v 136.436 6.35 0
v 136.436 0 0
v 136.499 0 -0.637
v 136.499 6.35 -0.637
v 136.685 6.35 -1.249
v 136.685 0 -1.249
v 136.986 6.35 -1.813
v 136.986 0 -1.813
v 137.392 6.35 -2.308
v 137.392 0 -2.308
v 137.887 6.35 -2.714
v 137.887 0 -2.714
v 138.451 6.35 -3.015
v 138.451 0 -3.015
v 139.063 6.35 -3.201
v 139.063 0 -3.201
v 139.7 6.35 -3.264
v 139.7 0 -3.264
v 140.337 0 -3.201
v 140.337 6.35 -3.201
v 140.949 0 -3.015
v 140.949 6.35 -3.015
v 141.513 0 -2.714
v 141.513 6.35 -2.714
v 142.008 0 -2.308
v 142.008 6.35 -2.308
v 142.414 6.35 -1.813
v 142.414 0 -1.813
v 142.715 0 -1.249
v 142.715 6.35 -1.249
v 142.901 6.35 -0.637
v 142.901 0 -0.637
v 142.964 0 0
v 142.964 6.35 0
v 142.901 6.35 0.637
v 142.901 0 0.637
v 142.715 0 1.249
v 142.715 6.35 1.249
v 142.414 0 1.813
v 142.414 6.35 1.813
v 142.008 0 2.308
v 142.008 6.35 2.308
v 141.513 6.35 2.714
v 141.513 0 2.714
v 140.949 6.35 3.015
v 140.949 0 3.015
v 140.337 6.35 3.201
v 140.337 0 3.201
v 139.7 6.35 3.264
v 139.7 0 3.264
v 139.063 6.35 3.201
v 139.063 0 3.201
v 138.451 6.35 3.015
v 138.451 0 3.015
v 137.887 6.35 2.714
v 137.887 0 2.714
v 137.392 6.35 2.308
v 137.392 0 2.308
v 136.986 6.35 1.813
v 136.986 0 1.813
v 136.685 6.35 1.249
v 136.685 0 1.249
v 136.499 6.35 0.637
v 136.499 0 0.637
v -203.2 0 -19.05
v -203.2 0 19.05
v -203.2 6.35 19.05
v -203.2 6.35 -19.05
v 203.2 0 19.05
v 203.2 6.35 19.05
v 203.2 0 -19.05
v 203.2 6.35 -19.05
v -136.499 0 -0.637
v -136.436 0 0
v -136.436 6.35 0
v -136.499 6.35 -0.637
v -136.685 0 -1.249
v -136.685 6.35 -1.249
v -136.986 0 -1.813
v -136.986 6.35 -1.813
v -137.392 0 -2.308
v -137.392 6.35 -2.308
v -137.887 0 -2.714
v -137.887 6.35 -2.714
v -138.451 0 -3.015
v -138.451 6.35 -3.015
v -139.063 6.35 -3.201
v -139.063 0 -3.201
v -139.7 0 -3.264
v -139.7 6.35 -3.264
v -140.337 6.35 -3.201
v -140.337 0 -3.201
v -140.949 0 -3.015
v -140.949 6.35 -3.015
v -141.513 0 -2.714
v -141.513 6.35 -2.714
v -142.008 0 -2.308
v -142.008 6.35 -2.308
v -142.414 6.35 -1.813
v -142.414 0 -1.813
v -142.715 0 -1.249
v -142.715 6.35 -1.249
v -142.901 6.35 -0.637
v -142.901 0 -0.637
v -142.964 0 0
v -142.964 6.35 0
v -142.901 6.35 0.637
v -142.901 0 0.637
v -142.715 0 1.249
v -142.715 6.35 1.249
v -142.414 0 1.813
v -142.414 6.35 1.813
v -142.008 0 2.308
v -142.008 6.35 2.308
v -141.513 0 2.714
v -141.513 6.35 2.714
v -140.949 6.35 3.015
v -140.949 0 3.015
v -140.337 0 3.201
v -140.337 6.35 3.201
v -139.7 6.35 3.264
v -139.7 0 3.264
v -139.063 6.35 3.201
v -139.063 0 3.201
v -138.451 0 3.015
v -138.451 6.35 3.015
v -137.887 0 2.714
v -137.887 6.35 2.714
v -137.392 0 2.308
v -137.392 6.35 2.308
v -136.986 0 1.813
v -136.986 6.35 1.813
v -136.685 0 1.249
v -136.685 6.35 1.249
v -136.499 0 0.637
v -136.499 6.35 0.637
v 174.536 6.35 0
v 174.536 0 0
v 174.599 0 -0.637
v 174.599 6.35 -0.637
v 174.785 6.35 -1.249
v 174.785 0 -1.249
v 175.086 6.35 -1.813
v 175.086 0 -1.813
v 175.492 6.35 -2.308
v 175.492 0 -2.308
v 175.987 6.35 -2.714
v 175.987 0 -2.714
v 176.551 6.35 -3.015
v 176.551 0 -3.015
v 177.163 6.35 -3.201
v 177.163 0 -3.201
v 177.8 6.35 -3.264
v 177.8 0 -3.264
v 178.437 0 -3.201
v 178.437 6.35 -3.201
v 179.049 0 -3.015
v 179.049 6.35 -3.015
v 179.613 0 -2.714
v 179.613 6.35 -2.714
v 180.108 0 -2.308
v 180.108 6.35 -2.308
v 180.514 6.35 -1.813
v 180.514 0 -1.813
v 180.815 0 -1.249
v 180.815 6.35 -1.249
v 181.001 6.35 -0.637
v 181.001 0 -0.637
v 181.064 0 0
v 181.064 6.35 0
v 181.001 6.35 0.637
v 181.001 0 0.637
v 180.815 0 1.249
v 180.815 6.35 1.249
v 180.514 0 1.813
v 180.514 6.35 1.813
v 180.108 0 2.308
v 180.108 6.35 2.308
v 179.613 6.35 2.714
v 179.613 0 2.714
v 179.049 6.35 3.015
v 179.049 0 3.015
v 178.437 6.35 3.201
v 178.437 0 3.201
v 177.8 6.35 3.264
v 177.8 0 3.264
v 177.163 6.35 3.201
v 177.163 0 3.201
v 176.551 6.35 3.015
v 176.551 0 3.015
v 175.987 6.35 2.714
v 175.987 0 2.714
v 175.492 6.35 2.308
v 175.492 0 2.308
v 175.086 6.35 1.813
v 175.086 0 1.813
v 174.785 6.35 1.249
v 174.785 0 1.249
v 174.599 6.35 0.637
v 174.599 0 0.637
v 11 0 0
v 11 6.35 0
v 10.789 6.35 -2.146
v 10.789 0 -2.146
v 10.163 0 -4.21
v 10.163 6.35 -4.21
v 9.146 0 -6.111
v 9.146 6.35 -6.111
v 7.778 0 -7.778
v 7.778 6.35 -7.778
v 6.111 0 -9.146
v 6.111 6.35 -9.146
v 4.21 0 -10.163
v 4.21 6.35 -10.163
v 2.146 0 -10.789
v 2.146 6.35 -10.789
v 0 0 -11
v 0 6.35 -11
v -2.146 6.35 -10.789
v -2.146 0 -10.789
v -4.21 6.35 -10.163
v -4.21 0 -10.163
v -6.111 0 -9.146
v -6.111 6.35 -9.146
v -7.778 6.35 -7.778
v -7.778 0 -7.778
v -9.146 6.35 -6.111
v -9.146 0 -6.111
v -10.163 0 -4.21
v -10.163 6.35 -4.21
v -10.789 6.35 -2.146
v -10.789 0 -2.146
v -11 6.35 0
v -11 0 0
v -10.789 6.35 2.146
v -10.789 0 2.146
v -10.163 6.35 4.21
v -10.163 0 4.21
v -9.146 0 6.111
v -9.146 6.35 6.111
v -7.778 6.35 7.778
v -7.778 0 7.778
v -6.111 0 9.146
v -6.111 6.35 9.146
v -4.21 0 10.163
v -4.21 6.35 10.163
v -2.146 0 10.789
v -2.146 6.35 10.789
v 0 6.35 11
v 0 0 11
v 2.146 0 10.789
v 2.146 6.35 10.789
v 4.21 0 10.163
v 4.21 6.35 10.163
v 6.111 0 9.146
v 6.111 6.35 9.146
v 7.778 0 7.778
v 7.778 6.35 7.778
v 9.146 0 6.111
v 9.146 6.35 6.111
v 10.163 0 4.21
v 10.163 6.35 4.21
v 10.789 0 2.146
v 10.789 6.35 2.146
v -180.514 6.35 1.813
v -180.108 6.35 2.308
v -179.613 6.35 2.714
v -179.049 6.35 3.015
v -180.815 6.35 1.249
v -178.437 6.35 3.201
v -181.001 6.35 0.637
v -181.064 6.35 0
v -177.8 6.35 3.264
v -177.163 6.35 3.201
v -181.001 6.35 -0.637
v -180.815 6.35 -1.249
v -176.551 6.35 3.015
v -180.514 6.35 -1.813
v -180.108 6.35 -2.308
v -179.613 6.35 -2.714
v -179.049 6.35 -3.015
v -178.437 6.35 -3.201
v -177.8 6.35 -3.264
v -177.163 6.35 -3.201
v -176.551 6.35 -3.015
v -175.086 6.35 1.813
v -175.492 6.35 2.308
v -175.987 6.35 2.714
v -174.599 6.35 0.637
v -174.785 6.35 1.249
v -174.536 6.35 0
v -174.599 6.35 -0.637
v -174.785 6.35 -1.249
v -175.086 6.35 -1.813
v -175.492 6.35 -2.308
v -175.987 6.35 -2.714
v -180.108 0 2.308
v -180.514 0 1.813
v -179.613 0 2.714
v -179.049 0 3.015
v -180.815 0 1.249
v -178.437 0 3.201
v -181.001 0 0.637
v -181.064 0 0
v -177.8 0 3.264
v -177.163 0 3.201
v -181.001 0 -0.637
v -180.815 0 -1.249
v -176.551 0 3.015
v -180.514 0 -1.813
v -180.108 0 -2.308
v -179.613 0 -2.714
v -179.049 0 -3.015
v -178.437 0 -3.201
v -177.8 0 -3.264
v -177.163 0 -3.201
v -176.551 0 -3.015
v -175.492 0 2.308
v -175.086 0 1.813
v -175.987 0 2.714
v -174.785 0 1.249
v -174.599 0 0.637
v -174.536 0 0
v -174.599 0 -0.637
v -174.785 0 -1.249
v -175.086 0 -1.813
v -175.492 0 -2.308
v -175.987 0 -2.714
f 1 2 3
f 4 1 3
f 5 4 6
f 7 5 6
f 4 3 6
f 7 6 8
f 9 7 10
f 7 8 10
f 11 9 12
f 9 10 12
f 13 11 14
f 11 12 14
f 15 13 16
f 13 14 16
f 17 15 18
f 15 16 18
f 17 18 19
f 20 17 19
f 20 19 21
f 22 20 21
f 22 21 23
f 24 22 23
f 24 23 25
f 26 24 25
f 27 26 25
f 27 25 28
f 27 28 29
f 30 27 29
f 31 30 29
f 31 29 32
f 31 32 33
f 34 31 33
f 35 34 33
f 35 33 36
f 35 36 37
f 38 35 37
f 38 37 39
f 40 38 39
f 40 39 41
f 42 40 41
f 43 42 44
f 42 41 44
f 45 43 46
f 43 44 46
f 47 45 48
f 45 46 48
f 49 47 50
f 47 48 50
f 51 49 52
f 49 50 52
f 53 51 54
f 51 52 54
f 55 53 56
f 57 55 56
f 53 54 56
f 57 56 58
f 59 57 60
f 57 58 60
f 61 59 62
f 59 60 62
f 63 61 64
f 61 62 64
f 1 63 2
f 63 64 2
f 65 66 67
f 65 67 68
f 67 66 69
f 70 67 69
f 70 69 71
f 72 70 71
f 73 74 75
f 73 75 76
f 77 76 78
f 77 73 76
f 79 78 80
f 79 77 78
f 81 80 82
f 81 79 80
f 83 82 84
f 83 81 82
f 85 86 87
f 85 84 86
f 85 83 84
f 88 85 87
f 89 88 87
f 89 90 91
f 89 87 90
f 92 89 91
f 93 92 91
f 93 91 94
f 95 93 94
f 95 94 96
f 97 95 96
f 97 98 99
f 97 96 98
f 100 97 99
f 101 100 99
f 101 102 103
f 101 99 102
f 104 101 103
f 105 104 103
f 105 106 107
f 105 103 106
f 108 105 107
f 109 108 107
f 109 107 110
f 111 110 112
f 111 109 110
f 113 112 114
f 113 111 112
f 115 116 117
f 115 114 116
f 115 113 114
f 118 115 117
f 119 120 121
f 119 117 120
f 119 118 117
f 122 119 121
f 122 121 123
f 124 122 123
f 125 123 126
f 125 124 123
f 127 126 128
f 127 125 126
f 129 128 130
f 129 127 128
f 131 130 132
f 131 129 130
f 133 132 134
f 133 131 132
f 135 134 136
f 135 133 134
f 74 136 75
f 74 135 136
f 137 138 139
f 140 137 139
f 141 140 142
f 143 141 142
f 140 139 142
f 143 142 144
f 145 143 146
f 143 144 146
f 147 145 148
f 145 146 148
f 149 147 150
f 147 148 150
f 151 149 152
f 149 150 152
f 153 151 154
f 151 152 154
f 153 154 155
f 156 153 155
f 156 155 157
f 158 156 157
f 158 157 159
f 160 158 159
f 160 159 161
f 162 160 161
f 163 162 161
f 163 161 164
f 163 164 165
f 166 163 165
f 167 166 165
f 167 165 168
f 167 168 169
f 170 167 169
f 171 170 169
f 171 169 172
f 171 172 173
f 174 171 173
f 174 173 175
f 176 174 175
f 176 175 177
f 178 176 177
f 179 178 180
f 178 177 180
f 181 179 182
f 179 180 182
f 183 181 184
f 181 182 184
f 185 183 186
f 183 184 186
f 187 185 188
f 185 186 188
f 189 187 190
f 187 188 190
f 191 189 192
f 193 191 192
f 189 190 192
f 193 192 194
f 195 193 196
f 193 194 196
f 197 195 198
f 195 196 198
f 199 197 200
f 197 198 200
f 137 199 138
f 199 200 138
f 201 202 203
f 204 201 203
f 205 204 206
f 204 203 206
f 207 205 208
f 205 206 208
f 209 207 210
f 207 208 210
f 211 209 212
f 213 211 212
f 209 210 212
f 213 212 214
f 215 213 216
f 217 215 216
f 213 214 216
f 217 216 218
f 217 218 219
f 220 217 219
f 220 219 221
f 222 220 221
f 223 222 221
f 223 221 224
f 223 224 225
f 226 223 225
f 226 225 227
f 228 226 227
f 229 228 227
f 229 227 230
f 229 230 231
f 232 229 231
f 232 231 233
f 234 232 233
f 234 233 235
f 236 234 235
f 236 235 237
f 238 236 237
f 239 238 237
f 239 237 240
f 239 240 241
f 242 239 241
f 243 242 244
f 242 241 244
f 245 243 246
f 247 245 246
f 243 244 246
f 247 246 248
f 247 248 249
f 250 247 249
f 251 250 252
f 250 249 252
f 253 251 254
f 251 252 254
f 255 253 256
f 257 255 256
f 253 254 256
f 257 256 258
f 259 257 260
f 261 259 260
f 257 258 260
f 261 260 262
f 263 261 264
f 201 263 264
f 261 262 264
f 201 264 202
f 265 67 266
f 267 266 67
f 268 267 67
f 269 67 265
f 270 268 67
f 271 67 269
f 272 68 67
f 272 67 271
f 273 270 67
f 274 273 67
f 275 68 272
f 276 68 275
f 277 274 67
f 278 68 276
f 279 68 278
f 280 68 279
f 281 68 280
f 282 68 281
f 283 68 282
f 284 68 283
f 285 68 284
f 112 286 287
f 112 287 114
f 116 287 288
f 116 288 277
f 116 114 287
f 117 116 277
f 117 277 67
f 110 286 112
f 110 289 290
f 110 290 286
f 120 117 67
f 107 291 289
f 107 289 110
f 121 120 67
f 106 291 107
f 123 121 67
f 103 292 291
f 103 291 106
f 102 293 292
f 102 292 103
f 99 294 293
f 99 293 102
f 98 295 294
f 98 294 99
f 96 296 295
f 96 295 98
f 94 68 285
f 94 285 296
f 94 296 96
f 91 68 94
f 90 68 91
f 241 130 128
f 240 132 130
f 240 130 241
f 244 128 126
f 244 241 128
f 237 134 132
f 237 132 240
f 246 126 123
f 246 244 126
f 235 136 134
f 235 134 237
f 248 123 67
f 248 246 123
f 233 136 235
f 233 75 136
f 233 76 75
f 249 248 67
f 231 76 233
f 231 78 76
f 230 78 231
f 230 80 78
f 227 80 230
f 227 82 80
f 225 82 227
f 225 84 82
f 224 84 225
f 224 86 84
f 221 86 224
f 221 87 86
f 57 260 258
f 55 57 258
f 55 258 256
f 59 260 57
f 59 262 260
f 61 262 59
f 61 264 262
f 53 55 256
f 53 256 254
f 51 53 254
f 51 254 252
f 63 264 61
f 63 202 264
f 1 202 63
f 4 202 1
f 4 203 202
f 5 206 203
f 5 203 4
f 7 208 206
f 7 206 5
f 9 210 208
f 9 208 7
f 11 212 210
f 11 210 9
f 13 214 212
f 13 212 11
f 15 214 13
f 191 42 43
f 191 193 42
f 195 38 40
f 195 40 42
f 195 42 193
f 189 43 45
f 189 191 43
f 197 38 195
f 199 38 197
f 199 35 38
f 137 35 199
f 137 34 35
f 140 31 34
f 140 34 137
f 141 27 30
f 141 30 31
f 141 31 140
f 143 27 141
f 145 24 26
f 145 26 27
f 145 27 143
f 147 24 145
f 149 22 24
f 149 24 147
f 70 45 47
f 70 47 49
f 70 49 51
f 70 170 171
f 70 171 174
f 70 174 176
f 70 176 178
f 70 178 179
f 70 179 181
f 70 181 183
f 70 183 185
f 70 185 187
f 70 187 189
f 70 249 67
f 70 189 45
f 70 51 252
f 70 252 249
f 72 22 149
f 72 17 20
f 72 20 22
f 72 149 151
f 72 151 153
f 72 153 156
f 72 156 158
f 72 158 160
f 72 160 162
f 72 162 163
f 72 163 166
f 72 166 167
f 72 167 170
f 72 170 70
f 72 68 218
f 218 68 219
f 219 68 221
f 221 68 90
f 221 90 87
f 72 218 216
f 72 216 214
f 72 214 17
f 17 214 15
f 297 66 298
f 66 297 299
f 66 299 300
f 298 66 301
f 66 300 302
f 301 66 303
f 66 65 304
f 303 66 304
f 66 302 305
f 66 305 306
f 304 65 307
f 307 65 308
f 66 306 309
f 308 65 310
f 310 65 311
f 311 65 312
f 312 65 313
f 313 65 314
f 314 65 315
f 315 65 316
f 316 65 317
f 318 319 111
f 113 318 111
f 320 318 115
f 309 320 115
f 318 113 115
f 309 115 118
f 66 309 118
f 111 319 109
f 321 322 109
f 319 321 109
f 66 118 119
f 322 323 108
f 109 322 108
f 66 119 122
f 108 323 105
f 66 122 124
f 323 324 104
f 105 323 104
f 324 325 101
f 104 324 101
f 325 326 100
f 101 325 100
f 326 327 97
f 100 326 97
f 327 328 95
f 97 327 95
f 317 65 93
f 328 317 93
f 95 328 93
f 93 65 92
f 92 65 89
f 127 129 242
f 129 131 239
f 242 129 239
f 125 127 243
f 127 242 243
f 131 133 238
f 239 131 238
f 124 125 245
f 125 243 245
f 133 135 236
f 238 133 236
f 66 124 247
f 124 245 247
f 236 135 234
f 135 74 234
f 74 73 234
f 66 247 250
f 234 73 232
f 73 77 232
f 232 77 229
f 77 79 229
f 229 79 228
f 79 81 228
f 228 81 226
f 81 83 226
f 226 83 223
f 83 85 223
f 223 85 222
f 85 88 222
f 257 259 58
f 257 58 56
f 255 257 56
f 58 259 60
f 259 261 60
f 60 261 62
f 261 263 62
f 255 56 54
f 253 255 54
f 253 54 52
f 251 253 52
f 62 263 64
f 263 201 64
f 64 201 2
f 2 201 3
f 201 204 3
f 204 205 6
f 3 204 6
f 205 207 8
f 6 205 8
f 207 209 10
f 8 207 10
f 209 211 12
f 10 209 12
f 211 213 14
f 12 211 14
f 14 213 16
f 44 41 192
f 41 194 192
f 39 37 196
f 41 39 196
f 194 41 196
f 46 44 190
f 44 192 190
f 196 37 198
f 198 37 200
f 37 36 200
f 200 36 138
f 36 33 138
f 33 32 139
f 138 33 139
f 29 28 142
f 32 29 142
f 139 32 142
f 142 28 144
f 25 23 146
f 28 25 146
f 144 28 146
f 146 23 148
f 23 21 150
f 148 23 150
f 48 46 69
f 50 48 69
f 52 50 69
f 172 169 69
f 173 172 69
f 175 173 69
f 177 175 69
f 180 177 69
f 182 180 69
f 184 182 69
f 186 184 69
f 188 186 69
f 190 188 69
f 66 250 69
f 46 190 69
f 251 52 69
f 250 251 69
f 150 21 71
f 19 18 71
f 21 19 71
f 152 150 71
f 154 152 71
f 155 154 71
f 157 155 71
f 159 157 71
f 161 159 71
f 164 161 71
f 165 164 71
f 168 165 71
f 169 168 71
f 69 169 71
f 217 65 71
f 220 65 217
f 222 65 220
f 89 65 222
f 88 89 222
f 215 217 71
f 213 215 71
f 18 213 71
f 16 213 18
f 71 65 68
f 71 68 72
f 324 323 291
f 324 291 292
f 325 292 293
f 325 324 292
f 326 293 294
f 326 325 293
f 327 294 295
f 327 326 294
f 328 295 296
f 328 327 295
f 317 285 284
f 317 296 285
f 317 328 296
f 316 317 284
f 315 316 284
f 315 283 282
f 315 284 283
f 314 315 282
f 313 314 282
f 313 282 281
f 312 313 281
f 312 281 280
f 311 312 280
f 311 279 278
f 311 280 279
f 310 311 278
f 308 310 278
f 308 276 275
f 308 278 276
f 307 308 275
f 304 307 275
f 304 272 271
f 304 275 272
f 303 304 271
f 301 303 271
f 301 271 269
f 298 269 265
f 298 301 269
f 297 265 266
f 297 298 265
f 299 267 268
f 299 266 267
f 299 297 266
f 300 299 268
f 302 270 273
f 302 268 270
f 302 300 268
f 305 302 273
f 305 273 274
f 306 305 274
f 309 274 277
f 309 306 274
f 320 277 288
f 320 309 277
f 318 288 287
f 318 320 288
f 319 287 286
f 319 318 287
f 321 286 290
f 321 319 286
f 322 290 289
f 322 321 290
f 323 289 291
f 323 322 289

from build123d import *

# Parameters (mm, degrees)
SKETCH1_W                = 406.4
SKETCH1_H                = 38.1
BOSS_EXTRUDE1_DEPTH      = 6.35
SKETCH2_R                = 11
CUT_EXTRUDE1_DEPTH       = 7.62
F_0_257_DIAMETER_HOLE1_D = 6.5278


with BuildPart() as part:
    # Sketch1 → Boss-Extrude1 (new body)
    with BuildSketch(Plane(origin=(0, 0, 0), x_dir=(1, 0, 0), z_dir=(0, 1, 0))):
        Rectangle(SKETCH1_W, SKETCH1_H)
    extrude(amount=BOSS_EXTRUDE1_DEPTH)

    # Sketch2 → Cut-Extrude1 (cut)
    with BuildSketch(Plane(origin=(0, 6.35, 0), x_dir=(1, 0, 0), z_dir=(0, 1, 0))):
        Circle(SKETCH2_R)
    extrude(amount=-CUT_EXTRUDE1_DEPTH, mode=Mode.SUBTRACT)

    # F (0.257) Diameter Hole1 (through all)
    with Locations(Plane(origin=(0, 6.35, 0), x_dir=(1, 0, 0), z_dir=(0, 1, 0))):
        with Locations((177.8, 0), (139.7, 0)):
            f_0_257_diameter_hole1 = Hole(F_0_257_DIAMETER_HOLE1_D / 2)

    # Mirror1: F (0.257) Diameter Hole1 across plane
    add(f_0_257_diameter_hole1.mirror(Plane(origin=(0, 0, 0), x_dir=(0, 0, 1), z_dir=(1, 0, 0))), mode=Mode.SUBTRACT)


solid = part.part
